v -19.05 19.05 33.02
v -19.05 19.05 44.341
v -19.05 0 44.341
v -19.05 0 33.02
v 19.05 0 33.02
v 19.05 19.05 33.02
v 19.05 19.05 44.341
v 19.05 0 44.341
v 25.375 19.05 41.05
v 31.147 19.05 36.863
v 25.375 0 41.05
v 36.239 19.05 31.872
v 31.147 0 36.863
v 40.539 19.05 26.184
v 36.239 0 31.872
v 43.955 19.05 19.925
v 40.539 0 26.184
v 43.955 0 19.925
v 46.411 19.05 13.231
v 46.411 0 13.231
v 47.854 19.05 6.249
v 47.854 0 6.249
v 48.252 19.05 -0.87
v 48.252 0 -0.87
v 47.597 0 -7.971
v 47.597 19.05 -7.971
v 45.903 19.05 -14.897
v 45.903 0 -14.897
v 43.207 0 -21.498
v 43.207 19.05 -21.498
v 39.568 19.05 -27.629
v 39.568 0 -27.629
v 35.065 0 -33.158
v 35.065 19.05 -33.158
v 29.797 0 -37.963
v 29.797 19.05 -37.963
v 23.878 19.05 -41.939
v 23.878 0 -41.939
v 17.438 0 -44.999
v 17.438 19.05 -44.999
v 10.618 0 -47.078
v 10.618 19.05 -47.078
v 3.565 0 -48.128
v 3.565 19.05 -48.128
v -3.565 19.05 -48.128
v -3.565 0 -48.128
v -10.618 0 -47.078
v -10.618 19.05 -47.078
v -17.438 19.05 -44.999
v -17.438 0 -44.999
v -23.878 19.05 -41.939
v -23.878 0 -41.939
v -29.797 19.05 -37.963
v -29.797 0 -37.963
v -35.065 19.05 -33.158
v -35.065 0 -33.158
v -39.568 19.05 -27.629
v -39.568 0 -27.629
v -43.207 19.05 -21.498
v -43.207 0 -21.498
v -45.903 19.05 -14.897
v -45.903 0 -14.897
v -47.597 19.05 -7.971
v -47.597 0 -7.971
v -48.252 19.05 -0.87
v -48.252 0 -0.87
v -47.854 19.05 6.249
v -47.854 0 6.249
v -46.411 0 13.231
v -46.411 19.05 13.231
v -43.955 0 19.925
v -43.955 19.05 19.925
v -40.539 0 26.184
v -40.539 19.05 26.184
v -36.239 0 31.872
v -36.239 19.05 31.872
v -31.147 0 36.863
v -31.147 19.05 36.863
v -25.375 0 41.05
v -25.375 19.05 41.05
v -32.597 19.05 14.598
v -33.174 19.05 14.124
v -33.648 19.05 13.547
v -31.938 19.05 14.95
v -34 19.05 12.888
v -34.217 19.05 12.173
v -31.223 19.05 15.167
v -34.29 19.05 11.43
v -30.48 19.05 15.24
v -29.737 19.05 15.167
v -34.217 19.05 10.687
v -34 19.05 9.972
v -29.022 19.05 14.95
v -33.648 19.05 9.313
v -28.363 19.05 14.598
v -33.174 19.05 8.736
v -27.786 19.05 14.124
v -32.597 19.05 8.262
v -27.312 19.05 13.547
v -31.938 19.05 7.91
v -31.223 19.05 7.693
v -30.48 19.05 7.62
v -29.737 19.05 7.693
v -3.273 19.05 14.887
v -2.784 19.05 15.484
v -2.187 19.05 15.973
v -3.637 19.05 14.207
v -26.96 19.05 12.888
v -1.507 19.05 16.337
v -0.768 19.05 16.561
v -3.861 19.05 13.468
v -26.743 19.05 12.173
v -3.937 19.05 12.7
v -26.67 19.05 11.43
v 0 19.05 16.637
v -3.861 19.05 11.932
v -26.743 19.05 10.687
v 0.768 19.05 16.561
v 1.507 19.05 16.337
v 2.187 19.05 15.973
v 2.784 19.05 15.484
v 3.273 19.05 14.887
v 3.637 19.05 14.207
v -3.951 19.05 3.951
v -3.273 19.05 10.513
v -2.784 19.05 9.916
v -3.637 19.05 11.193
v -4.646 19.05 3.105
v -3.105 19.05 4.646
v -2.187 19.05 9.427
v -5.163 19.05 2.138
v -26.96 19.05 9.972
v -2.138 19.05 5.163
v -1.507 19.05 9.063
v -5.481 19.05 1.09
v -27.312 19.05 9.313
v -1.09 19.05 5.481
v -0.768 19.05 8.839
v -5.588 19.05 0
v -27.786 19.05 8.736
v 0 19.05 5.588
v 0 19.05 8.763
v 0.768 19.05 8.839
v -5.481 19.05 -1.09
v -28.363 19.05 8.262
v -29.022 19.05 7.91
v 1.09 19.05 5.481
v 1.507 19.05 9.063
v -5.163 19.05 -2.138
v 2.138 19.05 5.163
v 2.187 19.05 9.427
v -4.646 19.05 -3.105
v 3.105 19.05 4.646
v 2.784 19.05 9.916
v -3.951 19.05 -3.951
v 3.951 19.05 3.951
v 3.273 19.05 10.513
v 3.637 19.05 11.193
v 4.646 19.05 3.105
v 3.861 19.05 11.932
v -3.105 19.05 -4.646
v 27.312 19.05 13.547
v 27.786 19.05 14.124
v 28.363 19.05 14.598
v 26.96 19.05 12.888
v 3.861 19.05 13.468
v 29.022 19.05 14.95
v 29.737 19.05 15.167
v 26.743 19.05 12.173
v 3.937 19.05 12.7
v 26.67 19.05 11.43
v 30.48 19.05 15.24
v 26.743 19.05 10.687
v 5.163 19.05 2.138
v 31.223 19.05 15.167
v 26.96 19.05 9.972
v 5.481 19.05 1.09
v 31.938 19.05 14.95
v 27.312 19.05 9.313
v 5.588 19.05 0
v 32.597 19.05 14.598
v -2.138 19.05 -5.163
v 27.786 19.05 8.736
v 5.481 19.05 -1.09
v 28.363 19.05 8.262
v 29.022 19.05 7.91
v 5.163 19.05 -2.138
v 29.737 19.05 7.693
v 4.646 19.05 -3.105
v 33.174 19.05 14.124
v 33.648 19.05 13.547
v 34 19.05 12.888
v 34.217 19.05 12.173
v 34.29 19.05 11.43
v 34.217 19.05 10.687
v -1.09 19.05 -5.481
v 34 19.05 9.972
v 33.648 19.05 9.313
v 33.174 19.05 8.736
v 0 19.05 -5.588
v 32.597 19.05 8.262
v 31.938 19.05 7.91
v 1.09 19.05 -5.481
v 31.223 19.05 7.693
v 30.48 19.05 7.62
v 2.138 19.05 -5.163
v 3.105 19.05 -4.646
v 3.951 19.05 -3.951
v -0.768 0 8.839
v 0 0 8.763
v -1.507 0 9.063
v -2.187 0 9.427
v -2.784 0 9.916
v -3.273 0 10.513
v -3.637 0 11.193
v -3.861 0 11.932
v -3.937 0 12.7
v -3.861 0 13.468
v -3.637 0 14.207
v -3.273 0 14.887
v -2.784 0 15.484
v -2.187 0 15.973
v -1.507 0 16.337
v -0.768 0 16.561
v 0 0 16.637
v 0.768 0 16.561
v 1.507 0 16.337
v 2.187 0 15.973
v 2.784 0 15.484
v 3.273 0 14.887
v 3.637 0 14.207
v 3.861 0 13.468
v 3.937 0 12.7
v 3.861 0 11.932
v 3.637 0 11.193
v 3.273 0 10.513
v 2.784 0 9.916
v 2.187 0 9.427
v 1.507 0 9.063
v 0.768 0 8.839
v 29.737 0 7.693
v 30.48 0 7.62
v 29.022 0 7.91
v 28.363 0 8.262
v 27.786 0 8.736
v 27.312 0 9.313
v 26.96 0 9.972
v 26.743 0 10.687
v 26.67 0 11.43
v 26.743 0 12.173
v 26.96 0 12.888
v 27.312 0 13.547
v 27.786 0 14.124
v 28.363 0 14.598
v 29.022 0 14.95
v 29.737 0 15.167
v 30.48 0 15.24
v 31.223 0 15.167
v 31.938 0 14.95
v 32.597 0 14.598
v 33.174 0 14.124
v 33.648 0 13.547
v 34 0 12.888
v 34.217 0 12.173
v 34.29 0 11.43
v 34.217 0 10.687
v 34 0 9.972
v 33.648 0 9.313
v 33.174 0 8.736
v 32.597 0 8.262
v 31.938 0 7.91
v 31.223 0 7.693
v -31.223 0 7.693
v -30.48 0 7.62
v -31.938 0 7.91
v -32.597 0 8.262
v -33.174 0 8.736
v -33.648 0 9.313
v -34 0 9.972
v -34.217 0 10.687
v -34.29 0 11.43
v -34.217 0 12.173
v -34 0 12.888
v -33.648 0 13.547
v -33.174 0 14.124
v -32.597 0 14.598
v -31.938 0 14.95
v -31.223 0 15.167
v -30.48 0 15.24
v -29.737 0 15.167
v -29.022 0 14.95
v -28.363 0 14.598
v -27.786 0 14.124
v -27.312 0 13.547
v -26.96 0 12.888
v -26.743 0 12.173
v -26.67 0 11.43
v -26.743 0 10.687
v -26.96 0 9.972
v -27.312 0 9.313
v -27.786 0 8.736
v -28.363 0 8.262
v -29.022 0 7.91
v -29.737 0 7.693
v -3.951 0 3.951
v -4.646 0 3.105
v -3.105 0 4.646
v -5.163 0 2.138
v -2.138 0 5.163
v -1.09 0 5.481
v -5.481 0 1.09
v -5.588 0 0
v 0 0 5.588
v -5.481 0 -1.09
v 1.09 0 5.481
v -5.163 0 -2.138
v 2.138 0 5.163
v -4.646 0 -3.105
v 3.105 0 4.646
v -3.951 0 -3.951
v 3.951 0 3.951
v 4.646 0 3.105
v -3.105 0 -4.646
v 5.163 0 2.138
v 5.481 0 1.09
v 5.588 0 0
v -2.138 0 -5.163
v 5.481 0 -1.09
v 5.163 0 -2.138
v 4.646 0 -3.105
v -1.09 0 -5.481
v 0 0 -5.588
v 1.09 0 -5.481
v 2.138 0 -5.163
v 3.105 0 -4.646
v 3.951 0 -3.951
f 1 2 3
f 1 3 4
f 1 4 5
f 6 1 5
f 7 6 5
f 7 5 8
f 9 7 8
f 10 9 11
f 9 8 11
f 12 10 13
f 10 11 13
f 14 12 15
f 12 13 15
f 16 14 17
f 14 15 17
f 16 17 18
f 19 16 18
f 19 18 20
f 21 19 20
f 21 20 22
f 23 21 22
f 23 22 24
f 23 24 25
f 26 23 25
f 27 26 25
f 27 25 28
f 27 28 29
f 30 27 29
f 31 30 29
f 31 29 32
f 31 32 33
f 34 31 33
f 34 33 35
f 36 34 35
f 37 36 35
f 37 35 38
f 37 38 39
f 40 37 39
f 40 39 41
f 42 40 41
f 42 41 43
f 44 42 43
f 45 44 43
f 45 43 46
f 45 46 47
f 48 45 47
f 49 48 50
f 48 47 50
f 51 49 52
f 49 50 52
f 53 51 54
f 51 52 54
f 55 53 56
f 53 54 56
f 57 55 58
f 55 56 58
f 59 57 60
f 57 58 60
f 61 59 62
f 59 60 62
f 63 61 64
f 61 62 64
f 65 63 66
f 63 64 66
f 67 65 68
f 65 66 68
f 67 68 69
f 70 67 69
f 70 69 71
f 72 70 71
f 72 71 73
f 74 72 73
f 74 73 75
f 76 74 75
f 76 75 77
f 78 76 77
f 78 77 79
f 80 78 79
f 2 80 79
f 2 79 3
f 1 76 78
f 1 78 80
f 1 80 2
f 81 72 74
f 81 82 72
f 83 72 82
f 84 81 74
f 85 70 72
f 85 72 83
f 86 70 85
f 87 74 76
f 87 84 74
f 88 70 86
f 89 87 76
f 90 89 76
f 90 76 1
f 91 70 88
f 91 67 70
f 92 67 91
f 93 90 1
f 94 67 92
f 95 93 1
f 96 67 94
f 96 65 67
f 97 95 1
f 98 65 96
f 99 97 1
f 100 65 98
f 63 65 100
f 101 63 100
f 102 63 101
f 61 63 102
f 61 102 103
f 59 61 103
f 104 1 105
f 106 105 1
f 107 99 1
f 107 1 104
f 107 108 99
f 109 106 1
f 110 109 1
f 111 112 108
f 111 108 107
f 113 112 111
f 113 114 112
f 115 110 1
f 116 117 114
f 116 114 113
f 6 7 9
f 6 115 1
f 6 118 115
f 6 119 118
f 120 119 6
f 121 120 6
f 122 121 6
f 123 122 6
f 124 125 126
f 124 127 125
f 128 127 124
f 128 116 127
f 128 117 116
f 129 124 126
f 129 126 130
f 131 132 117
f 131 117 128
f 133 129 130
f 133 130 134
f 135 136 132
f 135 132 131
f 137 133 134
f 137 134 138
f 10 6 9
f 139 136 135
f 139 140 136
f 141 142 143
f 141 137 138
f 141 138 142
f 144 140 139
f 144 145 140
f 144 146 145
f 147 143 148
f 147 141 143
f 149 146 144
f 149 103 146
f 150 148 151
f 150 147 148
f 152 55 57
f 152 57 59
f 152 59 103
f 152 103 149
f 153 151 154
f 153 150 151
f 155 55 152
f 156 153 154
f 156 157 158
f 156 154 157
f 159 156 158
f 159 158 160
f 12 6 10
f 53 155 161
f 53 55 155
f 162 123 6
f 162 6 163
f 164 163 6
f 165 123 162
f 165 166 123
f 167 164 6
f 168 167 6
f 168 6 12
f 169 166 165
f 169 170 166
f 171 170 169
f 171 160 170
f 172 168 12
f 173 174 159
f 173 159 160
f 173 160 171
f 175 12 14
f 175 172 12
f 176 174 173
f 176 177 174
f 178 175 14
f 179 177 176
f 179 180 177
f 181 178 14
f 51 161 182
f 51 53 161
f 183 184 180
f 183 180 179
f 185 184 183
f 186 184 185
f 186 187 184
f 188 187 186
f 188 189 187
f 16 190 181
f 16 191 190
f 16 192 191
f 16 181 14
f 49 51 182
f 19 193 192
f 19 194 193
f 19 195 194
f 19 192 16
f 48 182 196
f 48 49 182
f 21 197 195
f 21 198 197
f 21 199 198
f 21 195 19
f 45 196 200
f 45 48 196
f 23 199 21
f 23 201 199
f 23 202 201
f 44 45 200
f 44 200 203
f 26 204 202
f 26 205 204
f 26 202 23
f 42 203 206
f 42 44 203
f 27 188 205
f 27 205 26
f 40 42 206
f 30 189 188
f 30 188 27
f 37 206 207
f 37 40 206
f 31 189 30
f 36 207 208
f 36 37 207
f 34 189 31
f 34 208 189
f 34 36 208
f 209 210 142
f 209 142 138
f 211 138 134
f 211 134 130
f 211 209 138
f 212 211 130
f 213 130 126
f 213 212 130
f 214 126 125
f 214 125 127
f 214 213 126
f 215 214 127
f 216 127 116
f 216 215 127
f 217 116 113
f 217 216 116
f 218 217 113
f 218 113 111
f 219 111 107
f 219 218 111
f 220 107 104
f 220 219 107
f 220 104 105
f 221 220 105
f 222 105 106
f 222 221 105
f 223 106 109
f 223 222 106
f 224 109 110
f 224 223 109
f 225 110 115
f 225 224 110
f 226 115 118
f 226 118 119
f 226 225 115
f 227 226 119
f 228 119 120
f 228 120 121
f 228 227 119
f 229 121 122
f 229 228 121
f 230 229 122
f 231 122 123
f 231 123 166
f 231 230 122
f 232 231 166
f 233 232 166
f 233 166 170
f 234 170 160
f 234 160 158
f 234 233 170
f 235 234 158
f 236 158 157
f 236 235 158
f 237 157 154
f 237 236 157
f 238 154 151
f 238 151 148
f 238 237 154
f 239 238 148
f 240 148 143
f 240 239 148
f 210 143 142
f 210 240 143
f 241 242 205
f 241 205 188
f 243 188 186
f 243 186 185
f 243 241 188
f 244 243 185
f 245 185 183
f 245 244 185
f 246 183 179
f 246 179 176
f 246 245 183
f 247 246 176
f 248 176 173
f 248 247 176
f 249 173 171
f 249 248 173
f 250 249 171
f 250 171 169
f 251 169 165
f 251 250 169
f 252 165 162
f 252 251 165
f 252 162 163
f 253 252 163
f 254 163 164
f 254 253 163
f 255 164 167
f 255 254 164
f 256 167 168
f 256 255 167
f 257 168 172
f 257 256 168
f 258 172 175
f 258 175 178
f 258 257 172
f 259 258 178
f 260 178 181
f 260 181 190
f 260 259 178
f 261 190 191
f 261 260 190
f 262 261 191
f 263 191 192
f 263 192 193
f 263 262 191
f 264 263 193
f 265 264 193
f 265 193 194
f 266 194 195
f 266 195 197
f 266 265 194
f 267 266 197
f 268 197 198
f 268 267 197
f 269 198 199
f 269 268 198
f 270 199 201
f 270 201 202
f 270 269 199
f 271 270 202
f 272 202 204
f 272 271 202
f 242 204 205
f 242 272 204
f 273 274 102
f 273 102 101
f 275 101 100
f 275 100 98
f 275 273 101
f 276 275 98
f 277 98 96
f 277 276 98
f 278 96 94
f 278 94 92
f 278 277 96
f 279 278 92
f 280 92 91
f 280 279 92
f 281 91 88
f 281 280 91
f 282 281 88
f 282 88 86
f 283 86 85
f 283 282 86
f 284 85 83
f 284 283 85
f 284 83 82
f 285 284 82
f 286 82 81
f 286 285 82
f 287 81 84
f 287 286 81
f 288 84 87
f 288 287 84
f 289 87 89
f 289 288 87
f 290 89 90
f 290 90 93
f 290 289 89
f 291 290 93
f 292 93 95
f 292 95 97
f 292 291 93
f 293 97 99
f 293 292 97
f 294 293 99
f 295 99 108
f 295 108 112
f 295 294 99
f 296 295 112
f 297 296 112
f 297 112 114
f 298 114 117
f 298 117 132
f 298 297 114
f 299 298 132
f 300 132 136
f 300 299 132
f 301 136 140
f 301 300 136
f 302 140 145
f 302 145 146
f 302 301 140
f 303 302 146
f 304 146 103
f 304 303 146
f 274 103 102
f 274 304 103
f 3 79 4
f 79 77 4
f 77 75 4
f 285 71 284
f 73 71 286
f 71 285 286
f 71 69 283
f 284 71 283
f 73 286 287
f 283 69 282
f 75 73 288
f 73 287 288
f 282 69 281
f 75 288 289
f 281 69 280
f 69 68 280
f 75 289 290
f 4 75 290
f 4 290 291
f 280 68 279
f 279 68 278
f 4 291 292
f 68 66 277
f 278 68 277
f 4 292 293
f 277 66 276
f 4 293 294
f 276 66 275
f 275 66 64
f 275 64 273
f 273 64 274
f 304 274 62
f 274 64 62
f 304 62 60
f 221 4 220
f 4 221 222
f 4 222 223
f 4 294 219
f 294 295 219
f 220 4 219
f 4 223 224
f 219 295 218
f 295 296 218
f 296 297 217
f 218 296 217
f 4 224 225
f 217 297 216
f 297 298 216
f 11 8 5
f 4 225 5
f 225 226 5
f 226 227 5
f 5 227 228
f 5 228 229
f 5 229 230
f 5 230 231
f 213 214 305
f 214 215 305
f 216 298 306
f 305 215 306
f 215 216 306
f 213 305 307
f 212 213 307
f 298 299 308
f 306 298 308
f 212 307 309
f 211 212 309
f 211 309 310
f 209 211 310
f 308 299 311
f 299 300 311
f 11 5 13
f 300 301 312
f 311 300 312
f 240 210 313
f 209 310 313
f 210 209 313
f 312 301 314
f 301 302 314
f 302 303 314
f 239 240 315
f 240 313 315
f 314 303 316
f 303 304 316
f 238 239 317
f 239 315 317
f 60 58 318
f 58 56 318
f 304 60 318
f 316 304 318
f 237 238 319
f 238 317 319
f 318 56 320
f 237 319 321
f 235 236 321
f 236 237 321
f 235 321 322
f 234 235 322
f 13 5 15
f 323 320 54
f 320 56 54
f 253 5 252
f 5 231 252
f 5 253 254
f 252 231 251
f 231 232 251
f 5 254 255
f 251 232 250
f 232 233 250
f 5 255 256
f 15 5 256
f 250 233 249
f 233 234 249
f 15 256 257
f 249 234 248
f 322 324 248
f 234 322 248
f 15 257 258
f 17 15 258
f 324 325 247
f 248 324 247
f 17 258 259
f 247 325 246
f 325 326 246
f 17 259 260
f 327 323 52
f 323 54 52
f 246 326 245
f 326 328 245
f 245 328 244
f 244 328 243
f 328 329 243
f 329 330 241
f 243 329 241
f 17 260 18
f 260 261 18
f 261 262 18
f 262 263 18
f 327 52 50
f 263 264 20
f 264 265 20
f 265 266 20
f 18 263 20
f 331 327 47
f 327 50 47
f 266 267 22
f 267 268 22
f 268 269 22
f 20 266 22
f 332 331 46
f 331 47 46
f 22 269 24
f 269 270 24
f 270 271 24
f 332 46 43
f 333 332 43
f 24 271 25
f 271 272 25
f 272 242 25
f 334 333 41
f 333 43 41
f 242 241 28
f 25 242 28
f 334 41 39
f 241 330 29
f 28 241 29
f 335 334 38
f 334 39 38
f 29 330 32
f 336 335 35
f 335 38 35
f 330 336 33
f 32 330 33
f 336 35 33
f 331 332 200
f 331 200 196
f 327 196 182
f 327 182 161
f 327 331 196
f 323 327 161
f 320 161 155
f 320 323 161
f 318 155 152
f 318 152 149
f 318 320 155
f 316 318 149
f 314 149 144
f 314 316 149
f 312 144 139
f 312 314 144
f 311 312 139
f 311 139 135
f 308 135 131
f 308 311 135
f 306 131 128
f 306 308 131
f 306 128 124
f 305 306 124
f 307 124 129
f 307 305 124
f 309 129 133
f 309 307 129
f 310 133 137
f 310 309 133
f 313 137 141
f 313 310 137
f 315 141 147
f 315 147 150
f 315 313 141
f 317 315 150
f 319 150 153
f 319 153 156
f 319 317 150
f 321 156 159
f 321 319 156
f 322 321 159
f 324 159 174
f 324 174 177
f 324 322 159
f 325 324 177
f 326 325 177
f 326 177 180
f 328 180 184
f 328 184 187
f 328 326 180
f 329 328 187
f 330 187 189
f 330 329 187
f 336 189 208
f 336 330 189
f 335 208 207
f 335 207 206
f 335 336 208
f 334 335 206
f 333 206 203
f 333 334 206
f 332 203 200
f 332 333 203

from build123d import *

# Parameters (mm, degrees)
SKETCH1_R              = 3.81
SKETCH1_R_2            = 3.937
SKETCH1_R_3            = 5.588
BOSS_EXTRUDE1_DEPTH    = 19.05
SKETCH2_W              = 175.508996812
SKETCH2_H              = 124.727535594
SKETCH2_R              = 48.26
TOLERANCE_ADJUST_DEPTH = 63.5


with BuildPart() as part:
    # Sketch1 → Boss-Extrude1 (new body)
    with BuildSketch(Plane(origin=(0, 0, 0), x_dir=(1, 0, 0), z_dir=(0, 1, 0))):
        with BuildLine():
            Line((-19.05, -33.02), (19.05, -33.02))
            Line((19.05, -33.02), (19.05, -45.72))
            ThreePointArc((19.05, -45.72), (41.211451079, -27.474300719), (49.53, 0))
            ThreePointArc((49.53, 0), (-27.474300719, 41.211451079), (-19.05, -45.72))
            Line((-19.05, -45.72), (-19.05, -33.02))
        make_face()
        with Locations(Location((-30.48, -11.43, 0), (0, 0, 90))):
            Circle(SKETCH1_R, mode=Mode.SUBTRACT)
        with Locations(Location((0, -12.7, 0), (0, 0, 90))):
            Circle(SKETCH1_R_2, mode=Mode.SUBTRACT)
        with Locations(Location((30.48, -11.43, 0), (0, 0, 90))):
            Circle(SKETCH1_R, mode=Mode.SUBTRACT)
        with Locations(Location((0, 0, 0), (0, 0, 90))):
            Circle(SKETCH1_R_3, mode=Mode.SUBTRACT)
    extrude(amount=BOSS_EXTRUDE1_DEPTH)

    # Sketch2 → Tolerance Adjust (cut)
    with BuildSketch(Plane(origin=(0, 0, 0), x_dir=(1, 0, 0), z_dir=(0, 1, 0))):
        Rectangle(SKETCH2_W, SKETCH2_H)
        Circle(SKETCH2_R, mode=Mode.SUBTRACT)
    extrude(amount=TOLERANCE_ADJUST_DEPTH, mode=Mode.SUBTRACT)


solid = part.part
